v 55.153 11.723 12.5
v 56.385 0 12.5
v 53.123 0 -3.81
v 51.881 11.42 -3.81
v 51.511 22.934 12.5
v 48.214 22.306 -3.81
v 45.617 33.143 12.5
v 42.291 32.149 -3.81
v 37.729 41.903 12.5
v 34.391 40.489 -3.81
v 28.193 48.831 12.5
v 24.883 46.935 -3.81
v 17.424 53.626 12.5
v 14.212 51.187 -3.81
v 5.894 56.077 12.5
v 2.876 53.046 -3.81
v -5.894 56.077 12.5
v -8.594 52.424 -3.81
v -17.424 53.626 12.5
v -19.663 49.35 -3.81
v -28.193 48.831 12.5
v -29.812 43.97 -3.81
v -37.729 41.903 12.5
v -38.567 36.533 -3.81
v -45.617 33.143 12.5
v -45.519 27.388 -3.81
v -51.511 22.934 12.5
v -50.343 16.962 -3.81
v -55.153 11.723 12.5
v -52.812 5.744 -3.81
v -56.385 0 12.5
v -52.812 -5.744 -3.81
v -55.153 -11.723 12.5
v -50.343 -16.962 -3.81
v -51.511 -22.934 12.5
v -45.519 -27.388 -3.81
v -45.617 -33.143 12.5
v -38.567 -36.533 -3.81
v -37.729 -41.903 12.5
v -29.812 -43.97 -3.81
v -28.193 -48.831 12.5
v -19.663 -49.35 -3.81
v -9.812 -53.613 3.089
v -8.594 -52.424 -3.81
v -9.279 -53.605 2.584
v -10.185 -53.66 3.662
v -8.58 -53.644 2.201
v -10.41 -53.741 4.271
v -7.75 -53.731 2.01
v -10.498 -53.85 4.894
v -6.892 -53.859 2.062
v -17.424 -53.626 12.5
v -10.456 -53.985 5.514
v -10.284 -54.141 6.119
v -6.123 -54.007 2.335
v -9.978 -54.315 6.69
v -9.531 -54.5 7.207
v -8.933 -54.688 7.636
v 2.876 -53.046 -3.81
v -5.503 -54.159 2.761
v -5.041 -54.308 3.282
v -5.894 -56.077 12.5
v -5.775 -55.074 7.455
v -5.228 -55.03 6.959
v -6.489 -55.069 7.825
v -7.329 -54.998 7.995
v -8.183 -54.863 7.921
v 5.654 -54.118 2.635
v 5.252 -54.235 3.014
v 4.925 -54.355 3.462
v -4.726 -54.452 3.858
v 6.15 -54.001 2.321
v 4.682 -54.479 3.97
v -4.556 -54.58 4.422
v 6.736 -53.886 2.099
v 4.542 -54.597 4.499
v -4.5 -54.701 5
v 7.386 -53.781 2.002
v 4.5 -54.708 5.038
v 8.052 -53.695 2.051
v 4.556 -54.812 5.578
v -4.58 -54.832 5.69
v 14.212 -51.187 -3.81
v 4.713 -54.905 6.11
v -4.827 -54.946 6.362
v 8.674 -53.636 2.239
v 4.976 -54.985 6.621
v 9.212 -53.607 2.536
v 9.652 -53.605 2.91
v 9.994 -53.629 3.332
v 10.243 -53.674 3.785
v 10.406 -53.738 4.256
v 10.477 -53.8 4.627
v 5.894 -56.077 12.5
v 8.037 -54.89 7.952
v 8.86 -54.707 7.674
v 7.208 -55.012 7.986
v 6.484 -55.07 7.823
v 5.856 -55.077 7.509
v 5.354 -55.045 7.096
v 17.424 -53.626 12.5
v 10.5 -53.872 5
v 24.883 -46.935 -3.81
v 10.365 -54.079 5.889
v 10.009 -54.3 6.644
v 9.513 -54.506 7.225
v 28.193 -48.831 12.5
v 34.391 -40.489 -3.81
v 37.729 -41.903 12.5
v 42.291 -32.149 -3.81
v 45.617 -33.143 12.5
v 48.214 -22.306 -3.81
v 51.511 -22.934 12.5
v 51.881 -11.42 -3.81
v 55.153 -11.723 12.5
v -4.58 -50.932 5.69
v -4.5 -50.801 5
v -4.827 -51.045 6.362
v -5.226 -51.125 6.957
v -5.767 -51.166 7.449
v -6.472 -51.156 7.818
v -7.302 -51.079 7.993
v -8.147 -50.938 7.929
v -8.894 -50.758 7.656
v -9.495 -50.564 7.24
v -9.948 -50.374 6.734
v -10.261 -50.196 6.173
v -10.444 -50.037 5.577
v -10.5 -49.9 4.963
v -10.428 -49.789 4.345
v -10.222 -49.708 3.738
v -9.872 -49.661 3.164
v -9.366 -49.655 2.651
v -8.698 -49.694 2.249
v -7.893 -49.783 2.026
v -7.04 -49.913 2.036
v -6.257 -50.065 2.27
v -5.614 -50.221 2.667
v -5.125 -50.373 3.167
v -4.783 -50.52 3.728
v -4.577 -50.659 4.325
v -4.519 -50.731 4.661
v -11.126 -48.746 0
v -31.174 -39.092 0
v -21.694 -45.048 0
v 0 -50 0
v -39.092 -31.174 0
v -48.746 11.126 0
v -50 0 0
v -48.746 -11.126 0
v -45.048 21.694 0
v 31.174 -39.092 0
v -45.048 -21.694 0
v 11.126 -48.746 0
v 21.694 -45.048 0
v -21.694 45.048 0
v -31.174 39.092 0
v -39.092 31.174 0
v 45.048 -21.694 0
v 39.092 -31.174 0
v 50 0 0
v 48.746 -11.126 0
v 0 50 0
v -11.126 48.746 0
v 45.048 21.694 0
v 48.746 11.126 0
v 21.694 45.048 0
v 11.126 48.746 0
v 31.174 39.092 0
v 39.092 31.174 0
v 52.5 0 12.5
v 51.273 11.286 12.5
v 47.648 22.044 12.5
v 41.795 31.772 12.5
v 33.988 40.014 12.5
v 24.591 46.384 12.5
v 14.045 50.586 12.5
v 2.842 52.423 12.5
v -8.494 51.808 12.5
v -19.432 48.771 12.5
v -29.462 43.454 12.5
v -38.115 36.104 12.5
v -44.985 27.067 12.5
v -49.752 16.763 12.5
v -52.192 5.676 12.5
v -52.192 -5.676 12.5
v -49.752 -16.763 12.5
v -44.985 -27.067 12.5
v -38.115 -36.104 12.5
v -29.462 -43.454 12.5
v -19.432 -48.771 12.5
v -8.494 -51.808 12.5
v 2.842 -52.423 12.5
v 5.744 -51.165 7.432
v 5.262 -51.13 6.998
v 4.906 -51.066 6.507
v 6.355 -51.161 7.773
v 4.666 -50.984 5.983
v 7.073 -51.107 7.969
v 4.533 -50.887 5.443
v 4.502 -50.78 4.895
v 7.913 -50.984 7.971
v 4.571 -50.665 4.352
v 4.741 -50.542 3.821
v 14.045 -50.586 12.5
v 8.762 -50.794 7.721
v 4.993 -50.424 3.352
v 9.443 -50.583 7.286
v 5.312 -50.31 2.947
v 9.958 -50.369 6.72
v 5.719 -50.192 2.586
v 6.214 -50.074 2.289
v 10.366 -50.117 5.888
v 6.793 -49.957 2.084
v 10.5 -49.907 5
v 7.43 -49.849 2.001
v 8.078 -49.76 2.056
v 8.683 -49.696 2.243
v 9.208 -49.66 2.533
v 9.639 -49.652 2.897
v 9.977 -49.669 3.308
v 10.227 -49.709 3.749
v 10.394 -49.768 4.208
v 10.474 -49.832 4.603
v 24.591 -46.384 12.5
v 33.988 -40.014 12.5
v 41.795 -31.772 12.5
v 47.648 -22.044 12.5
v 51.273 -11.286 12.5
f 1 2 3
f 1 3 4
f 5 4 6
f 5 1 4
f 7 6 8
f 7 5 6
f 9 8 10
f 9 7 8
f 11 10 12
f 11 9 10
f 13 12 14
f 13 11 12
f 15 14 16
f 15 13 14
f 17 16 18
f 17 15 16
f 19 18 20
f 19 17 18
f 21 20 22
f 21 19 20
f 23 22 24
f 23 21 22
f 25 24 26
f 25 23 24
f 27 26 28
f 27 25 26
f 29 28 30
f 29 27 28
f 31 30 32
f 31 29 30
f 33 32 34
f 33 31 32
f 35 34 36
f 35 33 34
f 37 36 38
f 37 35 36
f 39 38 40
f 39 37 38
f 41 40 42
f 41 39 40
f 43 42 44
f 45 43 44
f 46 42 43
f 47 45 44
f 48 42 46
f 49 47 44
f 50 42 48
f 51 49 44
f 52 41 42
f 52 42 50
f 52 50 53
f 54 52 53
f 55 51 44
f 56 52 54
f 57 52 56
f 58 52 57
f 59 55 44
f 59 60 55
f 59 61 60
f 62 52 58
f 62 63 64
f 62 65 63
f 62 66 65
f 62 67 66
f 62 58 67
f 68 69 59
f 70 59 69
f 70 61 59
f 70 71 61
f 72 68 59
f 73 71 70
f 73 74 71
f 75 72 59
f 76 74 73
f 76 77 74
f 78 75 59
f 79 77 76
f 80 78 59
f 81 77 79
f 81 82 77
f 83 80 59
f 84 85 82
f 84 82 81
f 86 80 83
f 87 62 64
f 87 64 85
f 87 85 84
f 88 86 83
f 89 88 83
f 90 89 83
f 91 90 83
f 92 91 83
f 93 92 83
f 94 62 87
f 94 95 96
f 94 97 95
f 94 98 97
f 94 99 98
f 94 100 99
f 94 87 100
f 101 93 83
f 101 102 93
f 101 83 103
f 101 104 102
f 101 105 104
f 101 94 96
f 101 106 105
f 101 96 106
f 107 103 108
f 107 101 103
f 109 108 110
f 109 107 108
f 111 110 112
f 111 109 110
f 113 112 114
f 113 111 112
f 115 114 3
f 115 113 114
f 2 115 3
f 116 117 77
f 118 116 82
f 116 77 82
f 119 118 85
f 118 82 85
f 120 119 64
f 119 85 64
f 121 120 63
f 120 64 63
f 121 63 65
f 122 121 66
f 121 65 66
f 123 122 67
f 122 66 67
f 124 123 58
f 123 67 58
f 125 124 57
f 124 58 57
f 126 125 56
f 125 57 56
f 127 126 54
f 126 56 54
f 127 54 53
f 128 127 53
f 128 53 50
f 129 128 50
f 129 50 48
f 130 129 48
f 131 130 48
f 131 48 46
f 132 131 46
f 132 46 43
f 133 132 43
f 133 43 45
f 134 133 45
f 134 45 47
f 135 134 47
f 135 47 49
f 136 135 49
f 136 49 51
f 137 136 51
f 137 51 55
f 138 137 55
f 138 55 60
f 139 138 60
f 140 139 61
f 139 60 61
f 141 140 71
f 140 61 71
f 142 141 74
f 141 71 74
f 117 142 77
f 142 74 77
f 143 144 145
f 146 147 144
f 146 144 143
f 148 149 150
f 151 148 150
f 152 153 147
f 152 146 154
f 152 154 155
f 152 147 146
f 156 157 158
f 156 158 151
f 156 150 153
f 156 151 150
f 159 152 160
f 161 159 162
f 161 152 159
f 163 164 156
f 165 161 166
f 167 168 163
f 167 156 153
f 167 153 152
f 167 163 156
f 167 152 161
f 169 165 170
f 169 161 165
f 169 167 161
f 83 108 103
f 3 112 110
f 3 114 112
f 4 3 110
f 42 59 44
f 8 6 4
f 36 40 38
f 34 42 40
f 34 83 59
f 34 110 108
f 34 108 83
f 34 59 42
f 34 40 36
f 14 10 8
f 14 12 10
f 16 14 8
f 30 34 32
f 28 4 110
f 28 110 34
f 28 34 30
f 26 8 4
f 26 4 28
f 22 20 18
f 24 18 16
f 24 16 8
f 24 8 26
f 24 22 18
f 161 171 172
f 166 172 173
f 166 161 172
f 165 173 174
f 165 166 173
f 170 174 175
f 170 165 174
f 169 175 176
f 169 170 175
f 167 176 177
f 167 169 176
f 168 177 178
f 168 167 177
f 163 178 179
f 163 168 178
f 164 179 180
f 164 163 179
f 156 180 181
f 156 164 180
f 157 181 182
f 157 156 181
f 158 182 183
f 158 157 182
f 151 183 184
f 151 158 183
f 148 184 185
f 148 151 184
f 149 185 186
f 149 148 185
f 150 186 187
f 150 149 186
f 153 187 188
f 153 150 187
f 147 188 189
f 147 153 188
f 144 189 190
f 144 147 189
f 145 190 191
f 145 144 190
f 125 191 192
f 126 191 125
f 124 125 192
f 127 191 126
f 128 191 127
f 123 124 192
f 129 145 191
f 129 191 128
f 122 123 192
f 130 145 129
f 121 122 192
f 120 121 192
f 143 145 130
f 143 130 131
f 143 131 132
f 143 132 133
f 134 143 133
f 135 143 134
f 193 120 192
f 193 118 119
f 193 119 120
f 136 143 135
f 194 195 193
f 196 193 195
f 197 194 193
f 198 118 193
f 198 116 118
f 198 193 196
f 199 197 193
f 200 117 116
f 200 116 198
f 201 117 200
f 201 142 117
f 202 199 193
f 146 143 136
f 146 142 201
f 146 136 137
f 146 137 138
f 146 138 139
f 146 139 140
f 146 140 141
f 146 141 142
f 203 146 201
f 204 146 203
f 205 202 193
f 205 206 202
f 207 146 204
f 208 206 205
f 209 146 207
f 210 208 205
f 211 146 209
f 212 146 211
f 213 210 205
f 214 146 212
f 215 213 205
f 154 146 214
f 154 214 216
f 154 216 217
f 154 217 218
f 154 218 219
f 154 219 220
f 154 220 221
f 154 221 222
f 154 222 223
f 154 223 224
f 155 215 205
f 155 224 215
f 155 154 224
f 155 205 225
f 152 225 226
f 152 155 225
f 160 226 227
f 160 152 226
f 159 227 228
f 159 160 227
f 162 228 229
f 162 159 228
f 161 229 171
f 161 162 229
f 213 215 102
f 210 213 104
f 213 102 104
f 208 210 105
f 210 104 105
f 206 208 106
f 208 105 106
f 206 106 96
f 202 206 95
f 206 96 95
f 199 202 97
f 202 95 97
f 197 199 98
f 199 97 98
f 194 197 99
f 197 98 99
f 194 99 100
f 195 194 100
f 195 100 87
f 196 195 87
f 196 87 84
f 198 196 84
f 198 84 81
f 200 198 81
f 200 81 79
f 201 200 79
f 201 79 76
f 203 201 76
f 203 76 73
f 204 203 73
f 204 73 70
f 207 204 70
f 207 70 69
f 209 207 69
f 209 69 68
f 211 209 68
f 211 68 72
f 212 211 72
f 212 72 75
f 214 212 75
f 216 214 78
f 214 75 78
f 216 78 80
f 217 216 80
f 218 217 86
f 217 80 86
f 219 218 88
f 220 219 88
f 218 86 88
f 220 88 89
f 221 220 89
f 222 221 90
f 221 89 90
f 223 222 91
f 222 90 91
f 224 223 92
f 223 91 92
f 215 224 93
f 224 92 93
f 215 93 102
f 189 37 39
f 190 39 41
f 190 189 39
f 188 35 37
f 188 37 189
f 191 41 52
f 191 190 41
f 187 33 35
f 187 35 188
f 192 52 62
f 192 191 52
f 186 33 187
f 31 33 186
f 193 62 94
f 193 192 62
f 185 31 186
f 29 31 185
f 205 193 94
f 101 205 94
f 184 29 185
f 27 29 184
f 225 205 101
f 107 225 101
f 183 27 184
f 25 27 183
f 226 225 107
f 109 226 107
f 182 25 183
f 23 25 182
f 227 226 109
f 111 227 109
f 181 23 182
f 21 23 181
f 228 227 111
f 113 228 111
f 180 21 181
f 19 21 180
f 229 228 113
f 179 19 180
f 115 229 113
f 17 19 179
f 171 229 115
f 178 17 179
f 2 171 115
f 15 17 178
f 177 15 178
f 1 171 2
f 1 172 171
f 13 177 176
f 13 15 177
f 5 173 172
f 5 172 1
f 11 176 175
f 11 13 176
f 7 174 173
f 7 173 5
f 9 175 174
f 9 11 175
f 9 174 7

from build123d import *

# Parameters (mm, degrees)
F3_R     = 3
F4_DEPTH = 15


with BuildPart() as f1:
    # F0 (on Front) → F1 (revolve)
    with BuildSketch(Plane.XZ):
        Polygon((50, 0), (0, 0), (0, -3.81), (53.123453, -3.81), (56.385453, 12.5), (52.5, 12.5), align=None)
    revolve(axis=Axis((0, 0, 6.25), (0, 0, 1)))

    # F3 (on offset) → F4 (cut)
    with BuildSketch(Plane.XZ.offset(56.5)):
        with Locations((7.5, 5)):
            Circle(F3_R)
        with Locations((-7.5, 5)):
            Circle(F3_R)
    extrude(amount=-F4_DEPTH, mode=Mode.SUBTRACT)


solid = f1.part
